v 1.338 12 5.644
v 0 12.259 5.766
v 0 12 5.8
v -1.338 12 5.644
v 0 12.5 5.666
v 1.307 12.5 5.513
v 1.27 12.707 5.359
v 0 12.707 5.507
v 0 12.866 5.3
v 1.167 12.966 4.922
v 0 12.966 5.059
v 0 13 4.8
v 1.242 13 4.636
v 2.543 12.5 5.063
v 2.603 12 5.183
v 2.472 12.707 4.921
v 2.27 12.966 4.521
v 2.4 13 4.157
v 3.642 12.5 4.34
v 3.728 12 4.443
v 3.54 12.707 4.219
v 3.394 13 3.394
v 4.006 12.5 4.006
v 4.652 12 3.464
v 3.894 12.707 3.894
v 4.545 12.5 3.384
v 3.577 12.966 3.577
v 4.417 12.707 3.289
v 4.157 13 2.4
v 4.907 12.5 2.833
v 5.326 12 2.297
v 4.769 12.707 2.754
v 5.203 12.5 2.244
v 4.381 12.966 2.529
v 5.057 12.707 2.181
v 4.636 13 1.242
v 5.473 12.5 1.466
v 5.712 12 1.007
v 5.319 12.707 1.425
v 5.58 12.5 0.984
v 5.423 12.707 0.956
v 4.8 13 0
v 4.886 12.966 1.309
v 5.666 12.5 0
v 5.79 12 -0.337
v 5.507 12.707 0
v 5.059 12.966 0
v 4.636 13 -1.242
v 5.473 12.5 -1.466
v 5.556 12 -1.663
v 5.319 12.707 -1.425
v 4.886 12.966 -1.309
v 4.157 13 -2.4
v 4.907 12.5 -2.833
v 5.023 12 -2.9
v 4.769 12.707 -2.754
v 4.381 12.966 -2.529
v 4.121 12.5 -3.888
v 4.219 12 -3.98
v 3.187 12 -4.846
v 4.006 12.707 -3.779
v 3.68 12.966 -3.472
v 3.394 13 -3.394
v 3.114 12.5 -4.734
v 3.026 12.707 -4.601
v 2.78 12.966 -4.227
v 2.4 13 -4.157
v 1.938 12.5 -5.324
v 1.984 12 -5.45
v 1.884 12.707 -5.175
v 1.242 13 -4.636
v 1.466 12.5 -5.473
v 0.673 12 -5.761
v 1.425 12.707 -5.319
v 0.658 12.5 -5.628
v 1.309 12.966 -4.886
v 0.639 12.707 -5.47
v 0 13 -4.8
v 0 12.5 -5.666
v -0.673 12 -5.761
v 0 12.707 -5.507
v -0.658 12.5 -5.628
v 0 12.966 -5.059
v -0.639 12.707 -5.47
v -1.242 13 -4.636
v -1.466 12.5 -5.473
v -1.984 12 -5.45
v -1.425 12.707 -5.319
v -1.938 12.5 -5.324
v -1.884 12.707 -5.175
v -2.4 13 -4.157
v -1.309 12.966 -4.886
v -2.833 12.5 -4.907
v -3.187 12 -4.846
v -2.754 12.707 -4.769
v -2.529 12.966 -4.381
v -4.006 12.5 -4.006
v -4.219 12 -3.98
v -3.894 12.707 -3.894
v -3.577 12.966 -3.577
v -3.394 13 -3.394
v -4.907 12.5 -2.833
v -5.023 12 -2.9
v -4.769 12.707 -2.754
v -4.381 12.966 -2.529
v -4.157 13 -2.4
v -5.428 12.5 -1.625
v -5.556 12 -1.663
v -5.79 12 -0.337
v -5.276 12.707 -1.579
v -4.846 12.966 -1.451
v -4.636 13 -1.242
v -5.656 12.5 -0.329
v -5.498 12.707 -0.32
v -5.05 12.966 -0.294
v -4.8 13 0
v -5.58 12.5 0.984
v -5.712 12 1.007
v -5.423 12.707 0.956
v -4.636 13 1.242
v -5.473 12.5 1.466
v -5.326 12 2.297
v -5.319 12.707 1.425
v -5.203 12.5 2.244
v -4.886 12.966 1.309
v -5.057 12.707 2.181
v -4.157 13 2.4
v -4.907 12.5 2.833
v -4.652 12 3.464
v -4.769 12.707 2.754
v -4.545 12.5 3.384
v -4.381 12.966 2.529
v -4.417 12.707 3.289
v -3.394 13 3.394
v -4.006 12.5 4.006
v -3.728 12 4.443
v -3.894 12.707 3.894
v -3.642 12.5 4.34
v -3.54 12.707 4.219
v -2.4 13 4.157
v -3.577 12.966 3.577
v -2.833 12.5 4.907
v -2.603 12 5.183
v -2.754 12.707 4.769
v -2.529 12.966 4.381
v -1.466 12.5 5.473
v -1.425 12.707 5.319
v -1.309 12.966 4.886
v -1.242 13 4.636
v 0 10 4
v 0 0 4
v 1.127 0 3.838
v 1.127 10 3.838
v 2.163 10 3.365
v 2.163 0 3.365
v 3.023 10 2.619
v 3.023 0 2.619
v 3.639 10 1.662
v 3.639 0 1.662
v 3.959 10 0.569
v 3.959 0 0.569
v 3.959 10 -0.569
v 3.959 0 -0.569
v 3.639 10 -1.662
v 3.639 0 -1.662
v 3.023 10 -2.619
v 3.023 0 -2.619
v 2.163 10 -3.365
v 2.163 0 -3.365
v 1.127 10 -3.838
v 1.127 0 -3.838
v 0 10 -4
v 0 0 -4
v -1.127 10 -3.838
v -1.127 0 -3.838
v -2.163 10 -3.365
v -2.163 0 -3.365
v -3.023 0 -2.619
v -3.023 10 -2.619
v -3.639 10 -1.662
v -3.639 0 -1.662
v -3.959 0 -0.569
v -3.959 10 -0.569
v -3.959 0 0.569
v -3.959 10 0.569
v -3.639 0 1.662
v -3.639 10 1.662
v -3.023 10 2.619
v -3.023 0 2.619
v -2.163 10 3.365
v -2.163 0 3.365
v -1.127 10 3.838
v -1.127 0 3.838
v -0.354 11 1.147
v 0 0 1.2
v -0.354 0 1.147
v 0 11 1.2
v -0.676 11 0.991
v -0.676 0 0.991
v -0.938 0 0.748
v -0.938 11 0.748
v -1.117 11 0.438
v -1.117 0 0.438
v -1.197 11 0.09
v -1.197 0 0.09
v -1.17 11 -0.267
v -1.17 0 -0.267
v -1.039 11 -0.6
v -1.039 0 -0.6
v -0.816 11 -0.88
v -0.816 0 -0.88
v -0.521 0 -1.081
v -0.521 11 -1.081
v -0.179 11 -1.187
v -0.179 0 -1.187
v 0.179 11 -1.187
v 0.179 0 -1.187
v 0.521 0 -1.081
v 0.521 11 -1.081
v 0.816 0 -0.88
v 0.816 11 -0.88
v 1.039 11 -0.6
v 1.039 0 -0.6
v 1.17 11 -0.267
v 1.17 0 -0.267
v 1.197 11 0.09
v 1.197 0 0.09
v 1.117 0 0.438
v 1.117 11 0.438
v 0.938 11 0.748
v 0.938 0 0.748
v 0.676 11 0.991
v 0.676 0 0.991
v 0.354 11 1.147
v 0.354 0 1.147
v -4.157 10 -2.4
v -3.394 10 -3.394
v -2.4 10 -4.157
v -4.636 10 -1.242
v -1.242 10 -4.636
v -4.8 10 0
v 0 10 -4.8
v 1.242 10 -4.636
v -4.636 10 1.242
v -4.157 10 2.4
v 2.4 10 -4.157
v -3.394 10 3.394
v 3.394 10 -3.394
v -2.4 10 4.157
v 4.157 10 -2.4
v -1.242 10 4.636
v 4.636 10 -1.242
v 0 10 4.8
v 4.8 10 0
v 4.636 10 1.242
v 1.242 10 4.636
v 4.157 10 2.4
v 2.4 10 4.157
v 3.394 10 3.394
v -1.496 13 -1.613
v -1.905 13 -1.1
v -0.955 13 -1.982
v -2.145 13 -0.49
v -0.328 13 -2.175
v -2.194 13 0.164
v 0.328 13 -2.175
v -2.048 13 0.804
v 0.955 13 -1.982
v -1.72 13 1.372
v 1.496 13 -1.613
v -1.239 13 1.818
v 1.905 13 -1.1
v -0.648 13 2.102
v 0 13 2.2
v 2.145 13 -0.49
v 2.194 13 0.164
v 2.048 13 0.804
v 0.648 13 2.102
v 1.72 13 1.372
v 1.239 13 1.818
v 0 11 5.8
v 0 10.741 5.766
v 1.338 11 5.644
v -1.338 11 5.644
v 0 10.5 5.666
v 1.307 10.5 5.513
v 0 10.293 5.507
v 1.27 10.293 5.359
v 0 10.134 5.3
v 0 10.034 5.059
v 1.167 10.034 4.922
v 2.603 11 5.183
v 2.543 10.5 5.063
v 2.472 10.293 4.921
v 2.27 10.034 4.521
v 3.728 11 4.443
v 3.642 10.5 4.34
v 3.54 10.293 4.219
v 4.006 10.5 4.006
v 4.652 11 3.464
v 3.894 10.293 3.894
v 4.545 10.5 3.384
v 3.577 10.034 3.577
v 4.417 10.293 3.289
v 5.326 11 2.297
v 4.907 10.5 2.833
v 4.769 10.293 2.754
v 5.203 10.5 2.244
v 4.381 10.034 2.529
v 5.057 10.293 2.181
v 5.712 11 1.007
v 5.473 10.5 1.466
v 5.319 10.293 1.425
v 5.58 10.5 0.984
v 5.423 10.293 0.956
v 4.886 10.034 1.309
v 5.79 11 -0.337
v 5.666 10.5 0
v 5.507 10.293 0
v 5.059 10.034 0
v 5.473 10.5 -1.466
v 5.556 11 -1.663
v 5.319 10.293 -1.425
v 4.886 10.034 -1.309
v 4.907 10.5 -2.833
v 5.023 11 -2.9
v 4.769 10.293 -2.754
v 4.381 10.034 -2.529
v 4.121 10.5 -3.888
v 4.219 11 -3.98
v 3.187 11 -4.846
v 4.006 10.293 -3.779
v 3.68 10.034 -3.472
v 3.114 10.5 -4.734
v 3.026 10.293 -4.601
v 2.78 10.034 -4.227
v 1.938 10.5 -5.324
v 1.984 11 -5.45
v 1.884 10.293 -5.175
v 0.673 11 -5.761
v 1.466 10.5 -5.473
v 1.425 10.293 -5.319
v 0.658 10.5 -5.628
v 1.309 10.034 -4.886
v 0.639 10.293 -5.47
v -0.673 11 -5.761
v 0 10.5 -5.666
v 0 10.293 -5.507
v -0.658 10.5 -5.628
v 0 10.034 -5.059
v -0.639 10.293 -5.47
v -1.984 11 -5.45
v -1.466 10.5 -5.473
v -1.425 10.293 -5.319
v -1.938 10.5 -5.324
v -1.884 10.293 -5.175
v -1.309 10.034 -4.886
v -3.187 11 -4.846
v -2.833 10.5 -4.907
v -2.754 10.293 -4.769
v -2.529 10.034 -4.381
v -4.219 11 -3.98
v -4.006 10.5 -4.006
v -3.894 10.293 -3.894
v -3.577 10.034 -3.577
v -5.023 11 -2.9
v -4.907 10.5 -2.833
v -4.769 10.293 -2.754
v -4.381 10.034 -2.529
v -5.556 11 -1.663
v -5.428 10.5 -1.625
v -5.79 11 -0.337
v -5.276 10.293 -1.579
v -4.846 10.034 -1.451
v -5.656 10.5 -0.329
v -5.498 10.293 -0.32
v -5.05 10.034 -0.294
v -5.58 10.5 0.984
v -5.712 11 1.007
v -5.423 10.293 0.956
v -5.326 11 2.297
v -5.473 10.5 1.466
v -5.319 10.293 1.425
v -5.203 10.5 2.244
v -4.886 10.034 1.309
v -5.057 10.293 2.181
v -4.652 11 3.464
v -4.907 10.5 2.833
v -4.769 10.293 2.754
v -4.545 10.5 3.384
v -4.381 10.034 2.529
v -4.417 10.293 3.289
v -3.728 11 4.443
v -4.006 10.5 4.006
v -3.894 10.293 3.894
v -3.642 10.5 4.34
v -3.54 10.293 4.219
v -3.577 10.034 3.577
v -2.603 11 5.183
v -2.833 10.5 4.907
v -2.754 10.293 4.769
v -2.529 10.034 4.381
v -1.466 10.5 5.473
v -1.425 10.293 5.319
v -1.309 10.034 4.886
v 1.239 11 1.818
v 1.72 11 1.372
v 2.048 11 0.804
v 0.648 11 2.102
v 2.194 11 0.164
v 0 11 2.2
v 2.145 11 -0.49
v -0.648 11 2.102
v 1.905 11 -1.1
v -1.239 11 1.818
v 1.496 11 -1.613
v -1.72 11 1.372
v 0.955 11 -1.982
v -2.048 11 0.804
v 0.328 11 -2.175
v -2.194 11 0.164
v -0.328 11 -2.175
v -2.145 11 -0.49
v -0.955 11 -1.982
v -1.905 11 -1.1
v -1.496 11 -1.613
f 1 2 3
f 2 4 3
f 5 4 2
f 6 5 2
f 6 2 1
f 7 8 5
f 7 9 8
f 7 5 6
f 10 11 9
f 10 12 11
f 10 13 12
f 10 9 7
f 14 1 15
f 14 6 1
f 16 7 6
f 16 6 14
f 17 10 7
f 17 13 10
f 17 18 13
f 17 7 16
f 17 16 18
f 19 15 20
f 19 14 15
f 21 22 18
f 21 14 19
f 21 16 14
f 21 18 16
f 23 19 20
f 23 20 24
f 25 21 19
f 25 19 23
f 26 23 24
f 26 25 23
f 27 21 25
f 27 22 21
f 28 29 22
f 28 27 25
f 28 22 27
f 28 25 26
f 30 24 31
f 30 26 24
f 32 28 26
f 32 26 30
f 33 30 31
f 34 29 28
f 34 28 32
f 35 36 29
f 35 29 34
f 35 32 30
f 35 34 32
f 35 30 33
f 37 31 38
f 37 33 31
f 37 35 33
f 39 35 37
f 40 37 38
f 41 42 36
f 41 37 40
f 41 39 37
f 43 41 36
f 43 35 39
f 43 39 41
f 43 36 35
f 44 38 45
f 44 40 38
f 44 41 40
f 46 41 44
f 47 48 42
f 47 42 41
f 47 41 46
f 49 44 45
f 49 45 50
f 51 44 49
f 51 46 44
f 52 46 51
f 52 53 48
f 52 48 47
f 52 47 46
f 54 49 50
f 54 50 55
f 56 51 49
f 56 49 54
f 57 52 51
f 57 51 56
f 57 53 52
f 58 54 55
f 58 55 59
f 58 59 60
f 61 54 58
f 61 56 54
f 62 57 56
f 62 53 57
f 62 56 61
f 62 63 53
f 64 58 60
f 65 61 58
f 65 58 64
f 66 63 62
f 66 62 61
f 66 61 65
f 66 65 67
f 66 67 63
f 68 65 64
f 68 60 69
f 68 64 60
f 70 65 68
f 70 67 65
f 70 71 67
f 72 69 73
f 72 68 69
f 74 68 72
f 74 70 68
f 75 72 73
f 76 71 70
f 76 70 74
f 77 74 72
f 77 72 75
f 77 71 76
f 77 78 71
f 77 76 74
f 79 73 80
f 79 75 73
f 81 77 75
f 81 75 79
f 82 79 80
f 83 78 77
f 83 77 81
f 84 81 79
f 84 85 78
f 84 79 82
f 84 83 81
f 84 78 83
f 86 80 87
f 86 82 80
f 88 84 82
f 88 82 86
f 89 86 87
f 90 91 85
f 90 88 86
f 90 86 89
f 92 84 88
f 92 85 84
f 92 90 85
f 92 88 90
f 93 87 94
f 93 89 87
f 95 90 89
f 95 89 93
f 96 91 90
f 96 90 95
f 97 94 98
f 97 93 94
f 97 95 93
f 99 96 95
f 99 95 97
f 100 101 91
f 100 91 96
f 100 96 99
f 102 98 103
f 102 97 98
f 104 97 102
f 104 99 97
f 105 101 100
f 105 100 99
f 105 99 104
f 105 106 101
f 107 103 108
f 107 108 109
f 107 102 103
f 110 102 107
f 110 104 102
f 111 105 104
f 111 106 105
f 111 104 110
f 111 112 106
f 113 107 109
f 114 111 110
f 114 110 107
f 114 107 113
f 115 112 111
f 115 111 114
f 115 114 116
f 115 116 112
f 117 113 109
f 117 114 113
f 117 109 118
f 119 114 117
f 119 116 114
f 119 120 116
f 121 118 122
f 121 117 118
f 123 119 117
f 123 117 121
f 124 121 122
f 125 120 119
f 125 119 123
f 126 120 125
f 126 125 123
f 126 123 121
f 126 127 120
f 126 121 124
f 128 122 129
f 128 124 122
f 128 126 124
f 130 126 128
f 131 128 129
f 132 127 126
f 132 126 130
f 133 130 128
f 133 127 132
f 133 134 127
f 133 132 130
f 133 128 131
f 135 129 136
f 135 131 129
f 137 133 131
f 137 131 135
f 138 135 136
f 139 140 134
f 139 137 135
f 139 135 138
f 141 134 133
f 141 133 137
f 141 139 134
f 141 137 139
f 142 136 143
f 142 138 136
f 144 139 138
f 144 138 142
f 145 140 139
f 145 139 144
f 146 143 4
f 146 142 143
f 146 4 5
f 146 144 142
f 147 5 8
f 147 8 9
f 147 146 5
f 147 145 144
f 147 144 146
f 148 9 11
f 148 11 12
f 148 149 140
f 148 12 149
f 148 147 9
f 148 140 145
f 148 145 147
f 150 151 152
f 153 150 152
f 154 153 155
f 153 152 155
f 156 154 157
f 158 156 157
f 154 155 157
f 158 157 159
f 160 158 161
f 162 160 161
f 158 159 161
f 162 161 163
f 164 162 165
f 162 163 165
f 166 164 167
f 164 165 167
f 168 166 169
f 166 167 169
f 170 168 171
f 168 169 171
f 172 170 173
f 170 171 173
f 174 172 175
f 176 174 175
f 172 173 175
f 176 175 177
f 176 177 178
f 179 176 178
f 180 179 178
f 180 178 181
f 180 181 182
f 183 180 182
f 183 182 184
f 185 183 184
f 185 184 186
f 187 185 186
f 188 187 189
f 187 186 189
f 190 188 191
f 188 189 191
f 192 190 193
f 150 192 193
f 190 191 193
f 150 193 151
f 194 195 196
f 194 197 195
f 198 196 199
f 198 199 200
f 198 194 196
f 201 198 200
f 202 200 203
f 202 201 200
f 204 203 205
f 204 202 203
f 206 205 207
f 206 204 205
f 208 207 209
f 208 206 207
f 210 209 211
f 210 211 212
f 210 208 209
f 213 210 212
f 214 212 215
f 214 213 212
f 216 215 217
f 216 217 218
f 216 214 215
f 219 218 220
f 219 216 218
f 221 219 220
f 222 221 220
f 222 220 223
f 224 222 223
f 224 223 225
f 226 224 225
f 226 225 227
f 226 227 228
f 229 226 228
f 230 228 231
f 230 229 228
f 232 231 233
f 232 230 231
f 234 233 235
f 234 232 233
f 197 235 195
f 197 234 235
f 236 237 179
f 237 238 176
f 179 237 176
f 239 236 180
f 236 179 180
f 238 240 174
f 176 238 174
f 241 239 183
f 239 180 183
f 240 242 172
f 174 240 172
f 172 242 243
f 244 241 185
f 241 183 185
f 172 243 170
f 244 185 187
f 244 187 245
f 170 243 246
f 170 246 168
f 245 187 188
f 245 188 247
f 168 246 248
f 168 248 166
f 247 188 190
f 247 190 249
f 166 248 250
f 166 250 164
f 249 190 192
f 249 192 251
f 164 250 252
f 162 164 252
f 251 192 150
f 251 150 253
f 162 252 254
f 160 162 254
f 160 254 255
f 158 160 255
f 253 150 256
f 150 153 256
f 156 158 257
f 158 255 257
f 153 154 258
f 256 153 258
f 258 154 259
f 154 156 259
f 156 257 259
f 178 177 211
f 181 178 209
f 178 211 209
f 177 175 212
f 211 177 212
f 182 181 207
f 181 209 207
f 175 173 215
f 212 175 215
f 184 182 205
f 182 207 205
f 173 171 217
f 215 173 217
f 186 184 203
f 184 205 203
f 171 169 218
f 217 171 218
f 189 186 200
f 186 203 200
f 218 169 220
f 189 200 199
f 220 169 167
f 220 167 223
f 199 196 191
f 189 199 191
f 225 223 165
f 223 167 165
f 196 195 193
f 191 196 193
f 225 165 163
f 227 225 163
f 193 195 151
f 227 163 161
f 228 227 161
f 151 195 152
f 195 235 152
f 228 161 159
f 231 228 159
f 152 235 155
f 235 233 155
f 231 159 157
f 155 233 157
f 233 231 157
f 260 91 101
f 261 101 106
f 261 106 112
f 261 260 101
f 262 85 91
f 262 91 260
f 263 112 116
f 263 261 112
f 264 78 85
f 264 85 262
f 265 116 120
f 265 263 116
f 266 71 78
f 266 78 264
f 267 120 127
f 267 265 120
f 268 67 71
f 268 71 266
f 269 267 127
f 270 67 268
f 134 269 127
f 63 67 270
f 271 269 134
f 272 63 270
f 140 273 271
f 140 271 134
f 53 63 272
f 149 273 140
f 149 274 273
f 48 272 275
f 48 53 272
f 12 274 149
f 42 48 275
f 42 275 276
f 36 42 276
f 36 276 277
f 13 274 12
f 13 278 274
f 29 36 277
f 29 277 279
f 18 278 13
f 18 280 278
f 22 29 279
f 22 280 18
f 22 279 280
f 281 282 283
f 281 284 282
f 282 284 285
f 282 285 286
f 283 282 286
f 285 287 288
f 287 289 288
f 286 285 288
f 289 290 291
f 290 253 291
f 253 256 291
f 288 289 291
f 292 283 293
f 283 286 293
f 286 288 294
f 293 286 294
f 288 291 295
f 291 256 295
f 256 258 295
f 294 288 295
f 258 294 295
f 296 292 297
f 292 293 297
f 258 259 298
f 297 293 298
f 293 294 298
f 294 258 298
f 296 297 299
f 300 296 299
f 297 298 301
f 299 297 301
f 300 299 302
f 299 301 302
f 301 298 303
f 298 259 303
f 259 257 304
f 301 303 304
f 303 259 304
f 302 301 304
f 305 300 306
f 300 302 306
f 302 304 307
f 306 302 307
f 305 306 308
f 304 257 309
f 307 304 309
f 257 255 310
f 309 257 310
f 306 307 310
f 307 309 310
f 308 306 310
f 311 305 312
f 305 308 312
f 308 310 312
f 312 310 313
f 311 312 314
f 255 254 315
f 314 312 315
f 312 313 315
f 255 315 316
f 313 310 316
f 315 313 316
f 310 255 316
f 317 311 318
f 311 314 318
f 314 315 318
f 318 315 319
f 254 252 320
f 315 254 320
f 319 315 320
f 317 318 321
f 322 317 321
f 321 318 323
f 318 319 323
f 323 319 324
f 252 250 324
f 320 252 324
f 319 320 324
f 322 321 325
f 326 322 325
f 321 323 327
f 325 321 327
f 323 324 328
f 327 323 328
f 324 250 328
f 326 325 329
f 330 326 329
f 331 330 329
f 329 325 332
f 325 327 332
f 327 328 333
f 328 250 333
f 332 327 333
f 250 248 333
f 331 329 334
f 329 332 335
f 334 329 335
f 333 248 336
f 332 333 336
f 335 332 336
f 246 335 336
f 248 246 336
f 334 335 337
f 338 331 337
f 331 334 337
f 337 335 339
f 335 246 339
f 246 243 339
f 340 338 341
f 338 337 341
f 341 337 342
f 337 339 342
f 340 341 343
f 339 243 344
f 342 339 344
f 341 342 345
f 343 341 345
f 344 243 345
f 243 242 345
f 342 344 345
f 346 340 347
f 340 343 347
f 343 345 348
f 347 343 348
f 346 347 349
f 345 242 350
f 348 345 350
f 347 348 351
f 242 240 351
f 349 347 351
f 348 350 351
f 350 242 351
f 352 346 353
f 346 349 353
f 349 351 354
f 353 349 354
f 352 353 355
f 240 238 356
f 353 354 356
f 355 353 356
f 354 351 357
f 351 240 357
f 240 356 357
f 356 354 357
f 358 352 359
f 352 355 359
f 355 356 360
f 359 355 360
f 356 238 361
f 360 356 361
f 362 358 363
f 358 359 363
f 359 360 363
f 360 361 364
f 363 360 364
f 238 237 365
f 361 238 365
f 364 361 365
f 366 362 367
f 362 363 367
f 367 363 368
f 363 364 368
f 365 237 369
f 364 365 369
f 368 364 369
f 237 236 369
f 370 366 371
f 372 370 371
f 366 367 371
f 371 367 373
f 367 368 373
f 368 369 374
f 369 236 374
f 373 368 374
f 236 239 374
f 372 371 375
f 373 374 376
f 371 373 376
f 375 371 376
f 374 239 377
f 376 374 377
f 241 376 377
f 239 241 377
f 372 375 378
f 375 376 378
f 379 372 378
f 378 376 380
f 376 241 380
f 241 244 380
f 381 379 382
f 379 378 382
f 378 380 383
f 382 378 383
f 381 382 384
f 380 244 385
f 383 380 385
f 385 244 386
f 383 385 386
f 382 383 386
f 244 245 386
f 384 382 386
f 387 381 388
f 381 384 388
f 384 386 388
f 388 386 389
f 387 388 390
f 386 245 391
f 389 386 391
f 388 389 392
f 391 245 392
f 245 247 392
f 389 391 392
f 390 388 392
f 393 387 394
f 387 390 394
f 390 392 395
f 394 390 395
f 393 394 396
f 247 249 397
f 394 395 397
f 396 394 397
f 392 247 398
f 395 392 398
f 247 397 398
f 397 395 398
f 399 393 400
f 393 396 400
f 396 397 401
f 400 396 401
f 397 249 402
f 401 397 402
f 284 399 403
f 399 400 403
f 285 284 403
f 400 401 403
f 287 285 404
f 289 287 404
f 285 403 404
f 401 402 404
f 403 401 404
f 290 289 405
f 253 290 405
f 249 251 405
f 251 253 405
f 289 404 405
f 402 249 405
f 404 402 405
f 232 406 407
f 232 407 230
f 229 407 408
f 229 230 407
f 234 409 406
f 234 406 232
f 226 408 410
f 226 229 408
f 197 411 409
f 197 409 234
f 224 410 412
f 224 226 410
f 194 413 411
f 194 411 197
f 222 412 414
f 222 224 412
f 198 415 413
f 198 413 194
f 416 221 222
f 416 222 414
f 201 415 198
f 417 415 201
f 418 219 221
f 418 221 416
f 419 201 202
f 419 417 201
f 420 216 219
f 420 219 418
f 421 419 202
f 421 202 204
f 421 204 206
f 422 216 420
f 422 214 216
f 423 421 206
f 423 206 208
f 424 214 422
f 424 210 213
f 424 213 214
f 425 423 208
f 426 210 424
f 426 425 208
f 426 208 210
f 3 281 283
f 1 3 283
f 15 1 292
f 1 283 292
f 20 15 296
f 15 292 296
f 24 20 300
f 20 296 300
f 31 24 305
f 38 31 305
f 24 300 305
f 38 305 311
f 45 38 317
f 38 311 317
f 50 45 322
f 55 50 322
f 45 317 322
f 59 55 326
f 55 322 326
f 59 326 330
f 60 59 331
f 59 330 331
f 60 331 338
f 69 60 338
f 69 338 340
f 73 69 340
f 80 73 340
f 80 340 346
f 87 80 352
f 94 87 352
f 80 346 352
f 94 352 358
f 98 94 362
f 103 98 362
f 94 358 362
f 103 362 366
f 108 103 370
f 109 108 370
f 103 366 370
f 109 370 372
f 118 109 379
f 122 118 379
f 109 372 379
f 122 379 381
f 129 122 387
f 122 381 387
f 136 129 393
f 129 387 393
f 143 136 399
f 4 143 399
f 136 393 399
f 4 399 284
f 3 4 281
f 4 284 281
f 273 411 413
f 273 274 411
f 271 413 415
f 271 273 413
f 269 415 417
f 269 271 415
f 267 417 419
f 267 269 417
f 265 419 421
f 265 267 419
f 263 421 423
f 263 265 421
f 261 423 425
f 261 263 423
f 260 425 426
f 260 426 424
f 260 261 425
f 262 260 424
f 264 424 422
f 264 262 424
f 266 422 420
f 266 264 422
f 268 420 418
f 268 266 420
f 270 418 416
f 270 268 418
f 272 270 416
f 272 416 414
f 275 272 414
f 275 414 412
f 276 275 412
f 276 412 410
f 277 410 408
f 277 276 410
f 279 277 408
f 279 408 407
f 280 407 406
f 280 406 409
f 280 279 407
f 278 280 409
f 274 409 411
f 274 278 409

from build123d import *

# Parameters (mm, degrees)
SKETCH_1_R      = 4
EXTRUDE_1_DEPTH = 10
SKETCH_2_R      = 5.8
EXTRUDE_2_DEPTH = 3
FILLET_1_R      = 1


with BuildPart() as part:
    # 草图1 → 凸台-拉伸1 (new body)
    with BuildSketch(Plane(origin=(0, 0, 0), x_dir=(1, 0, 0), z_dir=(0, 1, 0))):
        with Locations(Location((0, 0, 0), (0, 0, 270))):
            Circle(SKETCH_1_R)
    extrude(amount=EXTRUDE_1_DEPTH)

    # 草图2 → 凸台-拉伸2 (add)
    with BuildSketch(Plane(origin=(0, 10, 0), x_dir=(1, 0, 0), z_dir=(0, 1, 0))):
        with Locations(Location((0, 0, 0), (0, 0, 270))):
            Circle(SKETCH_2_R)
    extrude(amount=EXTRUDE_2_DEPTH)

    # 草图4 → M2 凹头盖螺钉的柱形沉头孔1 (revolve, cut)
    with BuildSketch(Plane(origin=(0, 13, 0), x_dir=(0, 0, 1), z_dir=(1, 0, 0))):
        Polygon((0, 0), (0, 13), (1.2, 13), (1.2, 2), (2.2, 2), (2.2, 0), align=None)
    revolve(axis=Axis((0, 19.35, 0), (0, -1, 0)), mode=Mode.SUBTRACT)

    # 圆角1
    fillet_1_edges = [part.edges().sort_by_distance(p)[0] for p in [
        (0, 10, -5.8),
        (0, 13, -5.8),
    ]]
    fillet(fillet_1_edges, radius=FILLET_1_R)


solid = part.part
